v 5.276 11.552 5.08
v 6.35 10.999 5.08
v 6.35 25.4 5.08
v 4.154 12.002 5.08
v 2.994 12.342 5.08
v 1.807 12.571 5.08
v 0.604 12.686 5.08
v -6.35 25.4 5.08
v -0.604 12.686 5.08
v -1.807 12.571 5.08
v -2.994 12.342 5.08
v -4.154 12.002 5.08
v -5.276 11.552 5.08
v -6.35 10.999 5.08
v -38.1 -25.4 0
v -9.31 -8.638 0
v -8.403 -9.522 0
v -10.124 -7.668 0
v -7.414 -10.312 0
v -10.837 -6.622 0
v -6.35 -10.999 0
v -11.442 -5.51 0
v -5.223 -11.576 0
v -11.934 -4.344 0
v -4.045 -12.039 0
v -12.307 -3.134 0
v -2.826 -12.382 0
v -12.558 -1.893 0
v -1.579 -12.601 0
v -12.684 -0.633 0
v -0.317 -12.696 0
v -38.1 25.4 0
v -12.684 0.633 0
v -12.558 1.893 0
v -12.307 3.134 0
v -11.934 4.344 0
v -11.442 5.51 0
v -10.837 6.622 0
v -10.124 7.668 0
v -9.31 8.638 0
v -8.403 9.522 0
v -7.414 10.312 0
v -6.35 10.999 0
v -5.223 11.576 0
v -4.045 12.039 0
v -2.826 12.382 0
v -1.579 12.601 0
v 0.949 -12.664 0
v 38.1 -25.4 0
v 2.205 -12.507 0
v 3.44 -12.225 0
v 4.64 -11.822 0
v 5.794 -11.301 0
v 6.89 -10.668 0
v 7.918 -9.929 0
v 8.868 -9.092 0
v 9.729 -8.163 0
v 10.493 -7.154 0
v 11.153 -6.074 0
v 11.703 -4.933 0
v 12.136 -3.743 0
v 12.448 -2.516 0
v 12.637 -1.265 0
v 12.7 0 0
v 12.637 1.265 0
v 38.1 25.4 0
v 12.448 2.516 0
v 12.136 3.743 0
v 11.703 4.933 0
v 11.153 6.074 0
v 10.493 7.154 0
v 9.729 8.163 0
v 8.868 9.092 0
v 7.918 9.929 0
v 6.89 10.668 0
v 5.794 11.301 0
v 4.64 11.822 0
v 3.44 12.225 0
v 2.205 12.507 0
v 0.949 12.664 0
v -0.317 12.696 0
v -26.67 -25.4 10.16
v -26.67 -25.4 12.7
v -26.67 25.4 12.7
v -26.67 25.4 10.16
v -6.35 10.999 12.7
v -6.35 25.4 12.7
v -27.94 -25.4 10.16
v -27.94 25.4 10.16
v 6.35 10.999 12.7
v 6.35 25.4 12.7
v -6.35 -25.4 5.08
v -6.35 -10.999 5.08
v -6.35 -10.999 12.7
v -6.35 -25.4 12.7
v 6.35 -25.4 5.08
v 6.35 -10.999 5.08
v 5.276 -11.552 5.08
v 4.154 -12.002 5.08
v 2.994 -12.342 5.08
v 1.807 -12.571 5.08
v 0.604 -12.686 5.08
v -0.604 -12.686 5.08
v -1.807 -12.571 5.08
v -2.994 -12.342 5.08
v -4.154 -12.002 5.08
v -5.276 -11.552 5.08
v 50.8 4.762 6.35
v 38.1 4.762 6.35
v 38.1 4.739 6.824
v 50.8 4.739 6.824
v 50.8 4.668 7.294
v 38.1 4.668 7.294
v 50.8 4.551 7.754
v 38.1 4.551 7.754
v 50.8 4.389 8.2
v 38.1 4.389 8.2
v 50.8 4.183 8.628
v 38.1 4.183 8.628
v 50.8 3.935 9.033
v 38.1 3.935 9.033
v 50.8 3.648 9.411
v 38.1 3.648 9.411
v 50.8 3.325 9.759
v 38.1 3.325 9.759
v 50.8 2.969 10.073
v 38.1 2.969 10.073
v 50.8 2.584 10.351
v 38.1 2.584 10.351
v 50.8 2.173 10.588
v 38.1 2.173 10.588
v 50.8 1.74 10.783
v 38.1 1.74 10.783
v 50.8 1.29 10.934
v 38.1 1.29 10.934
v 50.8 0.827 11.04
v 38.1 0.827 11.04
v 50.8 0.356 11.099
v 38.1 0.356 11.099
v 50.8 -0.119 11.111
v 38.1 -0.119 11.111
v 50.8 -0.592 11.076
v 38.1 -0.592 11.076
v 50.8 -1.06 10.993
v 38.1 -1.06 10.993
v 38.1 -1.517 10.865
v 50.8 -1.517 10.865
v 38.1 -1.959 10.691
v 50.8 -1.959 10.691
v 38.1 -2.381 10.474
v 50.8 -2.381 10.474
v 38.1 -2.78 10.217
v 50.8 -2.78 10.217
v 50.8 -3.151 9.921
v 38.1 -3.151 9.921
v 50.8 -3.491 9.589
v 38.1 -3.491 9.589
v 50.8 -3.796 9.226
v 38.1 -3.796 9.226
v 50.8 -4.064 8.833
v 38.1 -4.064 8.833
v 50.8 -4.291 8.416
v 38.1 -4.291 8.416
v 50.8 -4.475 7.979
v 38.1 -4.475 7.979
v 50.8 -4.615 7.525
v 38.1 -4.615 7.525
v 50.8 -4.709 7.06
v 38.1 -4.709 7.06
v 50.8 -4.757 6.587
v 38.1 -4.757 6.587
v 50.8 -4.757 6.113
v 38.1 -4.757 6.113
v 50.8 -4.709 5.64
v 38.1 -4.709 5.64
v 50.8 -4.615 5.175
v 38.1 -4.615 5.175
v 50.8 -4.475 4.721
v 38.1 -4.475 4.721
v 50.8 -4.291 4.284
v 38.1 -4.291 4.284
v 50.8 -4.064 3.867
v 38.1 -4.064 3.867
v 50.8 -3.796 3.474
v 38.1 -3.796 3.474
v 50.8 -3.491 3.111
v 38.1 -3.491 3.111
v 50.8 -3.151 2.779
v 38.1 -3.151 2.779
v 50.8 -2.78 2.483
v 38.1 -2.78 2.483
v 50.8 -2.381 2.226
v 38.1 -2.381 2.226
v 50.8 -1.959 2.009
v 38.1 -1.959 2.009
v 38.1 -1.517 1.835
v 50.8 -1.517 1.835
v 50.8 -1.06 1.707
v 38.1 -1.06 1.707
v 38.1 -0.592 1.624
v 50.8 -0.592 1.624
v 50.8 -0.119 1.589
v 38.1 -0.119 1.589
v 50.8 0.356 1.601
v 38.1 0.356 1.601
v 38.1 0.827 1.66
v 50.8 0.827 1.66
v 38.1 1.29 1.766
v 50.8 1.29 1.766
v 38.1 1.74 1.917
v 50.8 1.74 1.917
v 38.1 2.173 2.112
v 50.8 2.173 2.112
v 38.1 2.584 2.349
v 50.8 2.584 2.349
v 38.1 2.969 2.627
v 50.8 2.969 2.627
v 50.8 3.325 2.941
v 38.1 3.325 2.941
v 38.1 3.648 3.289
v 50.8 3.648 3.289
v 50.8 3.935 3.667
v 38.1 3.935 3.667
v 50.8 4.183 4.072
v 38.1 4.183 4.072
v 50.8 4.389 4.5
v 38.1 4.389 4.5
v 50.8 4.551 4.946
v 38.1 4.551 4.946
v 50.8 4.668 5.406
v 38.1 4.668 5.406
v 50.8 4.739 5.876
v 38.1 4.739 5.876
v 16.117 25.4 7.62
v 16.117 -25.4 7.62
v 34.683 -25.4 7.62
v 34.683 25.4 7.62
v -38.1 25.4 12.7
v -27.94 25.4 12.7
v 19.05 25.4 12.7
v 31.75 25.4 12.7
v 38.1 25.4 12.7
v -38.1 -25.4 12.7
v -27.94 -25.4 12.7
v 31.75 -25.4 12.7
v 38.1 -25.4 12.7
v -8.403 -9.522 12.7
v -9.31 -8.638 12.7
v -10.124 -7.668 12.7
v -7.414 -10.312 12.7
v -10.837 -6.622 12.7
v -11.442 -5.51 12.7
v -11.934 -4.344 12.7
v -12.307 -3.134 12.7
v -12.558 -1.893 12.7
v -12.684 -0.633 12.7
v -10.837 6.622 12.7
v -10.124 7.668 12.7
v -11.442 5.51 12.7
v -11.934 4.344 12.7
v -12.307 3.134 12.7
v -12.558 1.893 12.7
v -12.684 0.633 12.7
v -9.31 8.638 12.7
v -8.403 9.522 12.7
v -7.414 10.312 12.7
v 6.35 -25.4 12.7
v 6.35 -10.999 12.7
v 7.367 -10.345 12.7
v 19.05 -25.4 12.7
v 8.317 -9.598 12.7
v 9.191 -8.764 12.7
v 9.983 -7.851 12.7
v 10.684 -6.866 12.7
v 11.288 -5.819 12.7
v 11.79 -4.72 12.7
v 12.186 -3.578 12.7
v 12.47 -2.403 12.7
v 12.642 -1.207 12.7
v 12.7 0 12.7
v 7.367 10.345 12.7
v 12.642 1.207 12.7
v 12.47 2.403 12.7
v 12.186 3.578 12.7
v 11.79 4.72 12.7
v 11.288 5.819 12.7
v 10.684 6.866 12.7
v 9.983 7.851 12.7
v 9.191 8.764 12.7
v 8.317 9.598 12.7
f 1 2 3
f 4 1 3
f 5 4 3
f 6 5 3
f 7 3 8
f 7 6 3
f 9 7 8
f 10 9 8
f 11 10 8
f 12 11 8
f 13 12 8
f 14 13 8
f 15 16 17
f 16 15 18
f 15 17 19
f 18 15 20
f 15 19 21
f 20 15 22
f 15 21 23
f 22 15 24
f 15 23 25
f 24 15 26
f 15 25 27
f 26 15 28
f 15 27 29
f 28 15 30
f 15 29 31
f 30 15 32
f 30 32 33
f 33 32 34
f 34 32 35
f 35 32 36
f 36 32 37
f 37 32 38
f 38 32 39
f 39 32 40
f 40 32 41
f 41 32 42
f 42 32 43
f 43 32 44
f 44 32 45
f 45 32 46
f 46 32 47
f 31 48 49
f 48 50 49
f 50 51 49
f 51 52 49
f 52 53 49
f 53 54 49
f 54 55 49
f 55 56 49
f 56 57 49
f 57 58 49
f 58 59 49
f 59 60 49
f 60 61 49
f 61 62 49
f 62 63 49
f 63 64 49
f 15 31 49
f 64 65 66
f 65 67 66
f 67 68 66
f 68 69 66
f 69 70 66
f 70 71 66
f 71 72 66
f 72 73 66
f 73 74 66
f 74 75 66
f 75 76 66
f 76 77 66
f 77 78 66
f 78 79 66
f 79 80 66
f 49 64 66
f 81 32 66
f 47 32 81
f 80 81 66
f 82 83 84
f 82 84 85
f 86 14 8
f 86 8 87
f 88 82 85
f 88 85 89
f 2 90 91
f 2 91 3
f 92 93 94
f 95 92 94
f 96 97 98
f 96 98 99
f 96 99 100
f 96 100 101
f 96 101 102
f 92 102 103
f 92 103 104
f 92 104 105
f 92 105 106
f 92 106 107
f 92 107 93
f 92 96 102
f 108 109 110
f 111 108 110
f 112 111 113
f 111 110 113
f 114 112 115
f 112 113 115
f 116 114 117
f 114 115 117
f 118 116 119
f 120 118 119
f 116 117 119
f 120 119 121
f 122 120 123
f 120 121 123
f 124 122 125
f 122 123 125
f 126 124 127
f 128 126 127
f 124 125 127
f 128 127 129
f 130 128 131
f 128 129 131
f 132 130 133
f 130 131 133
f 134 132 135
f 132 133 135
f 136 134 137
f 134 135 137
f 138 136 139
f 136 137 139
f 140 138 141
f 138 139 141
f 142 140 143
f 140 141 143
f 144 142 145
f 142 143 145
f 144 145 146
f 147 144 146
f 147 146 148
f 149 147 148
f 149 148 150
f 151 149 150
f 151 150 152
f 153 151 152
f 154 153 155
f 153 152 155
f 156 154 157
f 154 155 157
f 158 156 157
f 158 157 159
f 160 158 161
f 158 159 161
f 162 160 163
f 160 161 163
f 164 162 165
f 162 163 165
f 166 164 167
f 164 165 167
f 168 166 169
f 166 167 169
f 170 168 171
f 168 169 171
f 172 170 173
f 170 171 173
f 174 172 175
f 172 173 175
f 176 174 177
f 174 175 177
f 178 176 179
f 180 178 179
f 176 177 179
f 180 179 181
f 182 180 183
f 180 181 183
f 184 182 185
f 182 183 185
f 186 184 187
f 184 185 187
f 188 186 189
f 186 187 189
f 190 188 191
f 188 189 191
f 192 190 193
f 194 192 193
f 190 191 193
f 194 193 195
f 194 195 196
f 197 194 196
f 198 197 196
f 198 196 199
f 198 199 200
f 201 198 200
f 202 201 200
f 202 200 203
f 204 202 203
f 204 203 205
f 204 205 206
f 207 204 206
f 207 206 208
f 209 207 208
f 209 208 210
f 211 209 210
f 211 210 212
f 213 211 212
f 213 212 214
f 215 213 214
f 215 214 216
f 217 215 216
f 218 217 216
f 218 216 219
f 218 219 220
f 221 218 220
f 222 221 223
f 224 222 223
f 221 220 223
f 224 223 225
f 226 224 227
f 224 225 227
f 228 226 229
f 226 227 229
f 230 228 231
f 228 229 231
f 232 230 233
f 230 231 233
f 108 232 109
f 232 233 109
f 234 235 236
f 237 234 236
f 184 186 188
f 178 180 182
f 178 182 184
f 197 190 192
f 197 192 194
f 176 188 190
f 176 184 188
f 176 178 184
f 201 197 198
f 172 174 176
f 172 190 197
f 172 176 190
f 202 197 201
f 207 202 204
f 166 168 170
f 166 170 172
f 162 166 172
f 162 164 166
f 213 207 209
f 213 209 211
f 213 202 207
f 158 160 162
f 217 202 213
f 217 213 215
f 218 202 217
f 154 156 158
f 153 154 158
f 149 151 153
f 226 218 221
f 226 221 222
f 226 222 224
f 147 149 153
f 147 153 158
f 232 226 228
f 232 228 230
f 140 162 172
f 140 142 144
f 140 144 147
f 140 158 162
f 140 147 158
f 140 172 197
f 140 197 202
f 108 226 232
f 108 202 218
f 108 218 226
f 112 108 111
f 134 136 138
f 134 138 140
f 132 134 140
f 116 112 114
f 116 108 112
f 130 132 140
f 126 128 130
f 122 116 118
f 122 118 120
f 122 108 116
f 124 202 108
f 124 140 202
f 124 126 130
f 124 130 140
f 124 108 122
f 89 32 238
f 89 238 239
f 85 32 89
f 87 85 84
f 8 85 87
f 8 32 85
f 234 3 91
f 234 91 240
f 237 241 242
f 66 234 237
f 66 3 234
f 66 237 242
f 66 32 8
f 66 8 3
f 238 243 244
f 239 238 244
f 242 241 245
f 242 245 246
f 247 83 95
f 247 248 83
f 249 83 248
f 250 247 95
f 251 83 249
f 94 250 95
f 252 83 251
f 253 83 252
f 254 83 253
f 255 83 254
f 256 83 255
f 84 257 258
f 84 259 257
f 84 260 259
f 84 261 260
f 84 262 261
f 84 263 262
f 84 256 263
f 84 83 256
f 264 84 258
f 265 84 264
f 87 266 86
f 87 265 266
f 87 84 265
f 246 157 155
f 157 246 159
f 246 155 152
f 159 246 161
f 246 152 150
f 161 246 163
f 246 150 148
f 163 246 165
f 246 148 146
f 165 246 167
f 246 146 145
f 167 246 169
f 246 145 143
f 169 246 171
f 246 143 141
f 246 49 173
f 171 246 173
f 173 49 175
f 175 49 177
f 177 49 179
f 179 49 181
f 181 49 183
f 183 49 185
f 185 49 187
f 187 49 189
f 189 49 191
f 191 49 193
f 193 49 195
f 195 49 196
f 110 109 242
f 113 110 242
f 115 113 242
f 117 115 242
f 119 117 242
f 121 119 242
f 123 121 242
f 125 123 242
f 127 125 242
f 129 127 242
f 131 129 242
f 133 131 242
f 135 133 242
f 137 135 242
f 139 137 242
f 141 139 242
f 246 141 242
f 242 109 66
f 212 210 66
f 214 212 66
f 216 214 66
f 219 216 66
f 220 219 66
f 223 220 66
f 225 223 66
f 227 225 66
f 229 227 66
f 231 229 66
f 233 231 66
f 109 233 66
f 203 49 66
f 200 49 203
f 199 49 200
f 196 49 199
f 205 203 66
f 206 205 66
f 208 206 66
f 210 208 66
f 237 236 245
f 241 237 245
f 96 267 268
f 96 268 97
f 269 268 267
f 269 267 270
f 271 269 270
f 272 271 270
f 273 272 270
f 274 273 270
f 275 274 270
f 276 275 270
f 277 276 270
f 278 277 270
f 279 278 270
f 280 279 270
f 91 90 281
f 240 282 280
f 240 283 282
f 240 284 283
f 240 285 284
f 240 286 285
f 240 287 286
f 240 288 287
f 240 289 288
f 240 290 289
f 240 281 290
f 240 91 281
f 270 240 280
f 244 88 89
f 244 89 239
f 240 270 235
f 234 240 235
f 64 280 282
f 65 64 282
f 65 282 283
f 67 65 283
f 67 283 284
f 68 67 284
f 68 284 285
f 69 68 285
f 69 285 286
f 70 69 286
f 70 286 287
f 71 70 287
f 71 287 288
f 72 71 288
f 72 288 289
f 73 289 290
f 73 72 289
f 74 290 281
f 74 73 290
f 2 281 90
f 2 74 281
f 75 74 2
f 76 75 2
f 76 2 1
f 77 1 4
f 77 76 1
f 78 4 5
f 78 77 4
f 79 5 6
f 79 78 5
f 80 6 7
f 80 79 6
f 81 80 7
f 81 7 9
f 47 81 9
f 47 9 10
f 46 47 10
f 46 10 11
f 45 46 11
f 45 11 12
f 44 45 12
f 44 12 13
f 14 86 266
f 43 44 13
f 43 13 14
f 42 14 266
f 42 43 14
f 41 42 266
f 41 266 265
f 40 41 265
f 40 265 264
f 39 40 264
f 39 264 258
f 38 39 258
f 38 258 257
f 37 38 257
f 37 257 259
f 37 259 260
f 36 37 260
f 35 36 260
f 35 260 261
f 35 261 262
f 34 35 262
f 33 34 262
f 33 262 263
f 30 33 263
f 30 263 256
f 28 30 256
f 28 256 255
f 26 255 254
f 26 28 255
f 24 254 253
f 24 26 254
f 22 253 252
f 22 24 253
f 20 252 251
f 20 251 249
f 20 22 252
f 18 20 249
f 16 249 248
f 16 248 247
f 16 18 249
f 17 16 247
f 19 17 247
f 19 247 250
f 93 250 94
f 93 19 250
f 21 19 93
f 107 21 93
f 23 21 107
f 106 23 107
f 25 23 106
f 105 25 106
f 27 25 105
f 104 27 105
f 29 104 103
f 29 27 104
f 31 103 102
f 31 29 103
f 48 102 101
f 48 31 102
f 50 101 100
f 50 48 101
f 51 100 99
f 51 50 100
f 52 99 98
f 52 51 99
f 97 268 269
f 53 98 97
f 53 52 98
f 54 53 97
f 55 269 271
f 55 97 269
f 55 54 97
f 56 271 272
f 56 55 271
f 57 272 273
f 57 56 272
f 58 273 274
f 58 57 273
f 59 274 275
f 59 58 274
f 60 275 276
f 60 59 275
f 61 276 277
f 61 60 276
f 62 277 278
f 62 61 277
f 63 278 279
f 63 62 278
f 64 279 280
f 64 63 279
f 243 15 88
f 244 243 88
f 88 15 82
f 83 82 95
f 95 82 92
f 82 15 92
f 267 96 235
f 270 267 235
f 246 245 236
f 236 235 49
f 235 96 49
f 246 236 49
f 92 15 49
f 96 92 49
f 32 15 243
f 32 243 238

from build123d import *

# Parameters (mm, degrees)
F0_W     = 76.2
F0_H     = 50.8
F0_R     = 12.7
F1_DEPTH = 12.7
F3_DEPTH = 50.801
F5_DEPTH = 50.801
F6_R     = 4.7625
F7_DEPTH = 12.7


with BuildPart() as f1:
    # F0 (on Top) → F1 (new body)
    with BuildSketch(Plane.XY):
        Rectangle(F0_W, F0_H)
        Circle(F0_R, mode=Mode.SUBTRACT)
    extrude(amount=F1_DEPTH)

    # F2 (on face) → F3 (intersect, through all)
    with BuildSketch(Plane.XZ.offset(25.4)):
        Polygon((-27.94, 10.16), (-27.94, 12.7), (-38.1, 12.7), (-38.1, 0), (38.1, 0), (38.1, 12.7), (6.35, 12.7), (6.35, 5.08), (-6.35, 5.08), (-6.35, 12.7), (-26.67, 12.7), (-26.67, 10.16), align=None)
    extrude(amount=-F3_DEPTH, mode=Mode.INTERSECT)

    # F4 (on face) → F5 (cut, through all)
    with BuildSketch(Plane.XZ.offset(25.4)):
        Polygon((31.75, 12.7), (19.05, 12.7), (16.1170606325, 7.62), (34.6829393675, 7.62), align=None)
    extrude(amount=-F5_DEPTH, mode=Mode.SUBTRACT)

    # F6 (on face) → F7 (join)
    with BuildSketch(Plane.YZ.offset(38.1)):
        with Locations((0, 6.35)):
            Circle(F6_R)
    extrude(amount=F7_DEPTH)


solid = f1.part
